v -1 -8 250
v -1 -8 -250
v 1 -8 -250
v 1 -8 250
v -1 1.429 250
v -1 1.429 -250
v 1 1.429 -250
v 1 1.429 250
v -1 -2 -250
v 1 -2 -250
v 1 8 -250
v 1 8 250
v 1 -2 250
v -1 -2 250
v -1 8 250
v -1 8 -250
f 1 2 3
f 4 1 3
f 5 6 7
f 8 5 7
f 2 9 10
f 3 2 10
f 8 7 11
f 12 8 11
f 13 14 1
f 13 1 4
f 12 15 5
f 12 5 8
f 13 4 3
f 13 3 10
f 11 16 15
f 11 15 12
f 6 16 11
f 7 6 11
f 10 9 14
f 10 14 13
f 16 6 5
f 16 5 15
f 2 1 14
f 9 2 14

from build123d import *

# Parameters (mm, degrees)
BOSS_EXTRUDE1_DEPTH        = 250
BOSS_EXTRUDE1_DEPTH_BACK   = 250
SKETCH1_W                  = 2
SKETCH1_H                  = 6.571428571
BOSS_EXTRUDE1_2_DEPTH      = 250
BOSS_EXTRUDE1_2_DEPTH_BACK = 250
SKETCH1_H_2                = 6


with BuildPart() as part:
    # Sketch1 → Boss-Extrude1 (new, two sides: drawn at the far end of the back side and taken through both)
    with BuildSketch(Plane.XY.offset(-BOSS_EXTRUDE1_DEPTH_BACK)):
        with Locations((0, 4.714285714)):
            Rectangle(SKETCH1_W, SKETCH1_H)
    extrude(amount=BOSS_EXTRUDE1_DEPTH + BOSS_EXTRUDE1_DEPTH_BACK)


with BuildPart() as body_2:
    # Sketch1 → Boss-Extrude1 2 (new, two sides: drawn at the far end of the back side and taken through both)
    with BuildSketch(Plane.XY.offset(-BOSS_EXTRUDE1_2_DEPTH_BACK)):
        with Locations((0, -5)):
            Rectangle(SKETCH1_W, SKETCH1_H_2)
    extrude(amount=BOSS_EXTRUDE1_2_DEPTH + BOSS_EXTRUDE1_2_DEPTH_BACK)


solid = Compound([part.part, body_2.part])
